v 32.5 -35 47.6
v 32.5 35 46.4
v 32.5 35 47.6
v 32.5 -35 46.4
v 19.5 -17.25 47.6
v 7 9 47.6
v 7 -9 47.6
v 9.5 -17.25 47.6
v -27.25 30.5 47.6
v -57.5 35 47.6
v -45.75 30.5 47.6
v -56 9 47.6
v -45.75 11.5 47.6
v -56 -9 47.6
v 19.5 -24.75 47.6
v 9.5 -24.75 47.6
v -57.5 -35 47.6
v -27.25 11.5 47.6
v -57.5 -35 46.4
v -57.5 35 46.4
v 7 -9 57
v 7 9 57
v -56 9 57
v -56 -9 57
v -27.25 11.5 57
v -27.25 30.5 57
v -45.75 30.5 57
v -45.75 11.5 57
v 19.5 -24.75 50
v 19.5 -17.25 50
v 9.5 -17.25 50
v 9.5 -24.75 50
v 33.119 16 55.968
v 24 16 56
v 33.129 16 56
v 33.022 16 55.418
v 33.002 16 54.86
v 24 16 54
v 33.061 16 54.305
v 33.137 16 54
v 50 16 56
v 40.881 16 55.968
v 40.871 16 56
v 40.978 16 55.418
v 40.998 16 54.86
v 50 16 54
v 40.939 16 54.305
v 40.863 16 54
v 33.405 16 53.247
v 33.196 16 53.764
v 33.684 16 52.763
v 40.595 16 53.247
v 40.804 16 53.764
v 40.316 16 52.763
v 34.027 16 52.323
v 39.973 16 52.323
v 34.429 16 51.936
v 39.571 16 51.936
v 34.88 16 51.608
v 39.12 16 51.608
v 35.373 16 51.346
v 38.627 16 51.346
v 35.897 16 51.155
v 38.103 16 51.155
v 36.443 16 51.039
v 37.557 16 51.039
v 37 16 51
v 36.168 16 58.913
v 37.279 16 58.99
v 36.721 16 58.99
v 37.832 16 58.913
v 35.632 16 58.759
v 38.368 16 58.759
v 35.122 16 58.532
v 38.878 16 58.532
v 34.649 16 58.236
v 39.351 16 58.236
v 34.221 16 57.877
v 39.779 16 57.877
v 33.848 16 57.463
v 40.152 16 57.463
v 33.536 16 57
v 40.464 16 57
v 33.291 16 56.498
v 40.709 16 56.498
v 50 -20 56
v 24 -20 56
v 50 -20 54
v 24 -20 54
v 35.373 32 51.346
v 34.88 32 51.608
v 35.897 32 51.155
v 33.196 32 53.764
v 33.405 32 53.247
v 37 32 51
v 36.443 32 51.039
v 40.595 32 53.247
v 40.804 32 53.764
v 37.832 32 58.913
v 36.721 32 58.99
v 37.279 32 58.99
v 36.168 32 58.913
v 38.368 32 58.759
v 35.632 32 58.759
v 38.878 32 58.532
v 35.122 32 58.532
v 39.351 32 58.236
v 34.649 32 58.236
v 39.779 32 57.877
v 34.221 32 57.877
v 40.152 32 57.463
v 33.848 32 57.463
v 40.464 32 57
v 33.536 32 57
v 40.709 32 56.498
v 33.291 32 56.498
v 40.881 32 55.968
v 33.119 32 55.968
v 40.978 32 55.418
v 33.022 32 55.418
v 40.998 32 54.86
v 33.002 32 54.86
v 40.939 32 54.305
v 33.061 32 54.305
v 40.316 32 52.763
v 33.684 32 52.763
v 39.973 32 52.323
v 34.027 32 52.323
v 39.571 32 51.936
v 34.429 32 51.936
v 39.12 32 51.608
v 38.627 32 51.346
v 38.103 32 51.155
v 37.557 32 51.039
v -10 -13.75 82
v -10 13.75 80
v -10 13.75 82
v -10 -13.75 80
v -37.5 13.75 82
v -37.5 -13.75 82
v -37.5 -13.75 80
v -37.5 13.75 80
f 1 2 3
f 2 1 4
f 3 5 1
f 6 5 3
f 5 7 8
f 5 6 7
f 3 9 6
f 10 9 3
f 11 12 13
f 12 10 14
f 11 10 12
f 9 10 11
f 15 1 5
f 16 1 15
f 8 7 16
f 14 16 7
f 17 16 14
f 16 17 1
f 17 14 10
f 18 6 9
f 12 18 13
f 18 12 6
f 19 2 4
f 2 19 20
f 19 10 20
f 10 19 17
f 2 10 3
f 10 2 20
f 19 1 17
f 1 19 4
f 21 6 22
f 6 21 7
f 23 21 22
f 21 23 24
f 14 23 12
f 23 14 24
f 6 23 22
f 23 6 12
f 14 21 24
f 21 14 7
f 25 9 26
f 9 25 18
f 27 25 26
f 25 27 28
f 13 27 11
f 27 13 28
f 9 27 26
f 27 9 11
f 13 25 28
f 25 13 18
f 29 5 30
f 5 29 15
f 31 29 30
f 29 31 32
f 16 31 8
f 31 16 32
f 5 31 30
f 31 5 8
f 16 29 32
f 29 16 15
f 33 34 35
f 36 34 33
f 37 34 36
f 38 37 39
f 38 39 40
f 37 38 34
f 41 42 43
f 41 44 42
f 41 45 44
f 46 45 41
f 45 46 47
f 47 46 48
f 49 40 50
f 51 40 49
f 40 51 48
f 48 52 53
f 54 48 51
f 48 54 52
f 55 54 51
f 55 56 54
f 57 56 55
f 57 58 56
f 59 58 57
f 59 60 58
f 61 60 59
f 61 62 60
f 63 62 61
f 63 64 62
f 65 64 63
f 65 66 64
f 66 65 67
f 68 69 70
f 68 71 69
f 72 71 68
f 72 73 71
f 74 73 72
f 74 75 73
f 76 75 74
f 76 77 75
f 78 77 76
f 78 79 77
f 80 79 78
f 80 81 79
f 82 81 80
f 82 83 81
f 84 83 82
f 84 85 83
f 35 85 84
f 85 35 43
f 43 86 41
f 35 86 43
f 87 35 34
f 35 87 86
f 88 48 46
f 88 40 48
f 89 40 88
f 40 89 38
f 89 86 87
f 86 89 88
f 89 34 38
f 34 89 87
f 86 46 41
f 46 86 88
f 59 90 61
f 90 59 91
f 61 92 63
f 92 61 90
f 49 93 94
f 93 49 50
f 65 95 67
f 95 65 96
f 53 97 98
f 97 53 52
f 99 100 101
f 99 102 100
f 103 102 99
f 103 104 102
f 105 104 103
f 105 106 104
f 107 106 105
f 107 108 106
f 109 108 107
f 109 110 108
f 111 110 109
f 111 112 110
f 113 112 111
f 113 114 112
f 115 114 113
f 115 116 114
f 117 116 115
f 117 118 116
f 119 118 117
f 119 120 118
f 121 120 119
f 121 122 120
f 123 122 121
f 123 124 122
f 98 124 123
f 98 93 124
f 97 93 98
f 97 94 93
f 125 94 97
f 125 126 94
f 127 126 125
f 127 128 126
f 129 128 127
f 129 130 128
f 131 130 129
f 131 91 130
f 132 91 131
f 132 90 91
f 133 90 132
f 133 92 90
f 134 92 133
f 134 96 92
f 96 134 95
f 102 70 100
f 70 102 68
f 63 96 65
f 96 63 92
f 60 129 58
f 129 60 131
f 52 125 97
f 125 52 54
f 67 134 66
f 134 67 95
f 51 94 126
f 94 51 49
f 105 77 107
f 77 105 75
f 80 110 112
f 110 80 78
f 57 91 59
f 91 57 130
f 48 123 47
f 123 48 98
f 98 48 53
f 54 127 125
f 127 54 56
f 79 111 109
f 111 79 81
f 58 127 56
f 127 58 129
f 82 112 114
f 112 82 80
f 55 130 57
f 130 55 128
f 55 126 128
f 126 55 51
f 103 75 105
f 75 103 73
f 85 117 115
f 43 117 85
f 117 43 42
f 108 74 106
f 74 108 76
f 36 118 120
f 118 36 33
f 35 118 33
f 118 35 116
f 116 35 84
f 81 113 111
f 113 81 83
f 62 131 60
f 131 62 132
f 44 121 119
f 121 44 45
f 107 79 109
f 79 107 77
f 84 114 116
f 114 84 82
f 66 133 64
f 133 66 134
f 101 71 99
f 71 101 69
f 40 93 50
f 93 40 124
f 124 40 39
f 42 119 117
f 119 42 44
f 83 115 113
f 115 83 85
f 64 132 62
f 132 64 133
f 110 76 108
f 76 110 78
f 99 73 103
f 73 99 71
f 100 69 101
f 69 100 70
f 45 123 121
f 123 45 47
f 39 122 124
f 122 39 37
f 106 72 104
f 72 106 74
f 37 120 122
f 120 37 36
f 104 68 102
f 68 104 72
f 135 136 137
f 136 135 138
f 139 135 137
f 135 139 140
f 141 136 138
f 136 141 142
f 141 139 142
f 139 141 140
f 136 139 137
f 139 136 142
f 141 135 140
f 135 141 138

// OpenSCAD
$fs = 0.25;
$fa = 8;

module board() {

    translate ([-12.5, 0, 47]) {
        // base
        color("yellow") cube(size=[90, 70, 1.2], center=true);

        // teensy
        color("green") translate ([-12, 0, 5]) cube(size=[63, 18, 10], center=true);

        // MPU-9250
        color("red") translate ([-24, 21, 5]) cube(size=[18.5, 19, 10], center=true);

        // servo conn
        color("black") translate ([27, -21, 1.5]) cube(size=[10, 7.5, 3], center=true);
    }
}

module esc() {
//    translate ([33, -8, 79]) 
    translate ([37, -2, 55]) 
        rotate([0, 0, 90]) {
            color("green") cube(size=[36, 26, 2], center=true);
            color("black") translate ([36/2, 0, 0]) rotate([0, 90, 0]) cylinder(d=8, h=16, center=false);
        }
}

module lcd() {
    color("blue") translate([-40+2+27.5/2+0.5,0,81]) cube(size=[27.5, 27.5, 2], center=true);
}

board();
esc();
lcd();
